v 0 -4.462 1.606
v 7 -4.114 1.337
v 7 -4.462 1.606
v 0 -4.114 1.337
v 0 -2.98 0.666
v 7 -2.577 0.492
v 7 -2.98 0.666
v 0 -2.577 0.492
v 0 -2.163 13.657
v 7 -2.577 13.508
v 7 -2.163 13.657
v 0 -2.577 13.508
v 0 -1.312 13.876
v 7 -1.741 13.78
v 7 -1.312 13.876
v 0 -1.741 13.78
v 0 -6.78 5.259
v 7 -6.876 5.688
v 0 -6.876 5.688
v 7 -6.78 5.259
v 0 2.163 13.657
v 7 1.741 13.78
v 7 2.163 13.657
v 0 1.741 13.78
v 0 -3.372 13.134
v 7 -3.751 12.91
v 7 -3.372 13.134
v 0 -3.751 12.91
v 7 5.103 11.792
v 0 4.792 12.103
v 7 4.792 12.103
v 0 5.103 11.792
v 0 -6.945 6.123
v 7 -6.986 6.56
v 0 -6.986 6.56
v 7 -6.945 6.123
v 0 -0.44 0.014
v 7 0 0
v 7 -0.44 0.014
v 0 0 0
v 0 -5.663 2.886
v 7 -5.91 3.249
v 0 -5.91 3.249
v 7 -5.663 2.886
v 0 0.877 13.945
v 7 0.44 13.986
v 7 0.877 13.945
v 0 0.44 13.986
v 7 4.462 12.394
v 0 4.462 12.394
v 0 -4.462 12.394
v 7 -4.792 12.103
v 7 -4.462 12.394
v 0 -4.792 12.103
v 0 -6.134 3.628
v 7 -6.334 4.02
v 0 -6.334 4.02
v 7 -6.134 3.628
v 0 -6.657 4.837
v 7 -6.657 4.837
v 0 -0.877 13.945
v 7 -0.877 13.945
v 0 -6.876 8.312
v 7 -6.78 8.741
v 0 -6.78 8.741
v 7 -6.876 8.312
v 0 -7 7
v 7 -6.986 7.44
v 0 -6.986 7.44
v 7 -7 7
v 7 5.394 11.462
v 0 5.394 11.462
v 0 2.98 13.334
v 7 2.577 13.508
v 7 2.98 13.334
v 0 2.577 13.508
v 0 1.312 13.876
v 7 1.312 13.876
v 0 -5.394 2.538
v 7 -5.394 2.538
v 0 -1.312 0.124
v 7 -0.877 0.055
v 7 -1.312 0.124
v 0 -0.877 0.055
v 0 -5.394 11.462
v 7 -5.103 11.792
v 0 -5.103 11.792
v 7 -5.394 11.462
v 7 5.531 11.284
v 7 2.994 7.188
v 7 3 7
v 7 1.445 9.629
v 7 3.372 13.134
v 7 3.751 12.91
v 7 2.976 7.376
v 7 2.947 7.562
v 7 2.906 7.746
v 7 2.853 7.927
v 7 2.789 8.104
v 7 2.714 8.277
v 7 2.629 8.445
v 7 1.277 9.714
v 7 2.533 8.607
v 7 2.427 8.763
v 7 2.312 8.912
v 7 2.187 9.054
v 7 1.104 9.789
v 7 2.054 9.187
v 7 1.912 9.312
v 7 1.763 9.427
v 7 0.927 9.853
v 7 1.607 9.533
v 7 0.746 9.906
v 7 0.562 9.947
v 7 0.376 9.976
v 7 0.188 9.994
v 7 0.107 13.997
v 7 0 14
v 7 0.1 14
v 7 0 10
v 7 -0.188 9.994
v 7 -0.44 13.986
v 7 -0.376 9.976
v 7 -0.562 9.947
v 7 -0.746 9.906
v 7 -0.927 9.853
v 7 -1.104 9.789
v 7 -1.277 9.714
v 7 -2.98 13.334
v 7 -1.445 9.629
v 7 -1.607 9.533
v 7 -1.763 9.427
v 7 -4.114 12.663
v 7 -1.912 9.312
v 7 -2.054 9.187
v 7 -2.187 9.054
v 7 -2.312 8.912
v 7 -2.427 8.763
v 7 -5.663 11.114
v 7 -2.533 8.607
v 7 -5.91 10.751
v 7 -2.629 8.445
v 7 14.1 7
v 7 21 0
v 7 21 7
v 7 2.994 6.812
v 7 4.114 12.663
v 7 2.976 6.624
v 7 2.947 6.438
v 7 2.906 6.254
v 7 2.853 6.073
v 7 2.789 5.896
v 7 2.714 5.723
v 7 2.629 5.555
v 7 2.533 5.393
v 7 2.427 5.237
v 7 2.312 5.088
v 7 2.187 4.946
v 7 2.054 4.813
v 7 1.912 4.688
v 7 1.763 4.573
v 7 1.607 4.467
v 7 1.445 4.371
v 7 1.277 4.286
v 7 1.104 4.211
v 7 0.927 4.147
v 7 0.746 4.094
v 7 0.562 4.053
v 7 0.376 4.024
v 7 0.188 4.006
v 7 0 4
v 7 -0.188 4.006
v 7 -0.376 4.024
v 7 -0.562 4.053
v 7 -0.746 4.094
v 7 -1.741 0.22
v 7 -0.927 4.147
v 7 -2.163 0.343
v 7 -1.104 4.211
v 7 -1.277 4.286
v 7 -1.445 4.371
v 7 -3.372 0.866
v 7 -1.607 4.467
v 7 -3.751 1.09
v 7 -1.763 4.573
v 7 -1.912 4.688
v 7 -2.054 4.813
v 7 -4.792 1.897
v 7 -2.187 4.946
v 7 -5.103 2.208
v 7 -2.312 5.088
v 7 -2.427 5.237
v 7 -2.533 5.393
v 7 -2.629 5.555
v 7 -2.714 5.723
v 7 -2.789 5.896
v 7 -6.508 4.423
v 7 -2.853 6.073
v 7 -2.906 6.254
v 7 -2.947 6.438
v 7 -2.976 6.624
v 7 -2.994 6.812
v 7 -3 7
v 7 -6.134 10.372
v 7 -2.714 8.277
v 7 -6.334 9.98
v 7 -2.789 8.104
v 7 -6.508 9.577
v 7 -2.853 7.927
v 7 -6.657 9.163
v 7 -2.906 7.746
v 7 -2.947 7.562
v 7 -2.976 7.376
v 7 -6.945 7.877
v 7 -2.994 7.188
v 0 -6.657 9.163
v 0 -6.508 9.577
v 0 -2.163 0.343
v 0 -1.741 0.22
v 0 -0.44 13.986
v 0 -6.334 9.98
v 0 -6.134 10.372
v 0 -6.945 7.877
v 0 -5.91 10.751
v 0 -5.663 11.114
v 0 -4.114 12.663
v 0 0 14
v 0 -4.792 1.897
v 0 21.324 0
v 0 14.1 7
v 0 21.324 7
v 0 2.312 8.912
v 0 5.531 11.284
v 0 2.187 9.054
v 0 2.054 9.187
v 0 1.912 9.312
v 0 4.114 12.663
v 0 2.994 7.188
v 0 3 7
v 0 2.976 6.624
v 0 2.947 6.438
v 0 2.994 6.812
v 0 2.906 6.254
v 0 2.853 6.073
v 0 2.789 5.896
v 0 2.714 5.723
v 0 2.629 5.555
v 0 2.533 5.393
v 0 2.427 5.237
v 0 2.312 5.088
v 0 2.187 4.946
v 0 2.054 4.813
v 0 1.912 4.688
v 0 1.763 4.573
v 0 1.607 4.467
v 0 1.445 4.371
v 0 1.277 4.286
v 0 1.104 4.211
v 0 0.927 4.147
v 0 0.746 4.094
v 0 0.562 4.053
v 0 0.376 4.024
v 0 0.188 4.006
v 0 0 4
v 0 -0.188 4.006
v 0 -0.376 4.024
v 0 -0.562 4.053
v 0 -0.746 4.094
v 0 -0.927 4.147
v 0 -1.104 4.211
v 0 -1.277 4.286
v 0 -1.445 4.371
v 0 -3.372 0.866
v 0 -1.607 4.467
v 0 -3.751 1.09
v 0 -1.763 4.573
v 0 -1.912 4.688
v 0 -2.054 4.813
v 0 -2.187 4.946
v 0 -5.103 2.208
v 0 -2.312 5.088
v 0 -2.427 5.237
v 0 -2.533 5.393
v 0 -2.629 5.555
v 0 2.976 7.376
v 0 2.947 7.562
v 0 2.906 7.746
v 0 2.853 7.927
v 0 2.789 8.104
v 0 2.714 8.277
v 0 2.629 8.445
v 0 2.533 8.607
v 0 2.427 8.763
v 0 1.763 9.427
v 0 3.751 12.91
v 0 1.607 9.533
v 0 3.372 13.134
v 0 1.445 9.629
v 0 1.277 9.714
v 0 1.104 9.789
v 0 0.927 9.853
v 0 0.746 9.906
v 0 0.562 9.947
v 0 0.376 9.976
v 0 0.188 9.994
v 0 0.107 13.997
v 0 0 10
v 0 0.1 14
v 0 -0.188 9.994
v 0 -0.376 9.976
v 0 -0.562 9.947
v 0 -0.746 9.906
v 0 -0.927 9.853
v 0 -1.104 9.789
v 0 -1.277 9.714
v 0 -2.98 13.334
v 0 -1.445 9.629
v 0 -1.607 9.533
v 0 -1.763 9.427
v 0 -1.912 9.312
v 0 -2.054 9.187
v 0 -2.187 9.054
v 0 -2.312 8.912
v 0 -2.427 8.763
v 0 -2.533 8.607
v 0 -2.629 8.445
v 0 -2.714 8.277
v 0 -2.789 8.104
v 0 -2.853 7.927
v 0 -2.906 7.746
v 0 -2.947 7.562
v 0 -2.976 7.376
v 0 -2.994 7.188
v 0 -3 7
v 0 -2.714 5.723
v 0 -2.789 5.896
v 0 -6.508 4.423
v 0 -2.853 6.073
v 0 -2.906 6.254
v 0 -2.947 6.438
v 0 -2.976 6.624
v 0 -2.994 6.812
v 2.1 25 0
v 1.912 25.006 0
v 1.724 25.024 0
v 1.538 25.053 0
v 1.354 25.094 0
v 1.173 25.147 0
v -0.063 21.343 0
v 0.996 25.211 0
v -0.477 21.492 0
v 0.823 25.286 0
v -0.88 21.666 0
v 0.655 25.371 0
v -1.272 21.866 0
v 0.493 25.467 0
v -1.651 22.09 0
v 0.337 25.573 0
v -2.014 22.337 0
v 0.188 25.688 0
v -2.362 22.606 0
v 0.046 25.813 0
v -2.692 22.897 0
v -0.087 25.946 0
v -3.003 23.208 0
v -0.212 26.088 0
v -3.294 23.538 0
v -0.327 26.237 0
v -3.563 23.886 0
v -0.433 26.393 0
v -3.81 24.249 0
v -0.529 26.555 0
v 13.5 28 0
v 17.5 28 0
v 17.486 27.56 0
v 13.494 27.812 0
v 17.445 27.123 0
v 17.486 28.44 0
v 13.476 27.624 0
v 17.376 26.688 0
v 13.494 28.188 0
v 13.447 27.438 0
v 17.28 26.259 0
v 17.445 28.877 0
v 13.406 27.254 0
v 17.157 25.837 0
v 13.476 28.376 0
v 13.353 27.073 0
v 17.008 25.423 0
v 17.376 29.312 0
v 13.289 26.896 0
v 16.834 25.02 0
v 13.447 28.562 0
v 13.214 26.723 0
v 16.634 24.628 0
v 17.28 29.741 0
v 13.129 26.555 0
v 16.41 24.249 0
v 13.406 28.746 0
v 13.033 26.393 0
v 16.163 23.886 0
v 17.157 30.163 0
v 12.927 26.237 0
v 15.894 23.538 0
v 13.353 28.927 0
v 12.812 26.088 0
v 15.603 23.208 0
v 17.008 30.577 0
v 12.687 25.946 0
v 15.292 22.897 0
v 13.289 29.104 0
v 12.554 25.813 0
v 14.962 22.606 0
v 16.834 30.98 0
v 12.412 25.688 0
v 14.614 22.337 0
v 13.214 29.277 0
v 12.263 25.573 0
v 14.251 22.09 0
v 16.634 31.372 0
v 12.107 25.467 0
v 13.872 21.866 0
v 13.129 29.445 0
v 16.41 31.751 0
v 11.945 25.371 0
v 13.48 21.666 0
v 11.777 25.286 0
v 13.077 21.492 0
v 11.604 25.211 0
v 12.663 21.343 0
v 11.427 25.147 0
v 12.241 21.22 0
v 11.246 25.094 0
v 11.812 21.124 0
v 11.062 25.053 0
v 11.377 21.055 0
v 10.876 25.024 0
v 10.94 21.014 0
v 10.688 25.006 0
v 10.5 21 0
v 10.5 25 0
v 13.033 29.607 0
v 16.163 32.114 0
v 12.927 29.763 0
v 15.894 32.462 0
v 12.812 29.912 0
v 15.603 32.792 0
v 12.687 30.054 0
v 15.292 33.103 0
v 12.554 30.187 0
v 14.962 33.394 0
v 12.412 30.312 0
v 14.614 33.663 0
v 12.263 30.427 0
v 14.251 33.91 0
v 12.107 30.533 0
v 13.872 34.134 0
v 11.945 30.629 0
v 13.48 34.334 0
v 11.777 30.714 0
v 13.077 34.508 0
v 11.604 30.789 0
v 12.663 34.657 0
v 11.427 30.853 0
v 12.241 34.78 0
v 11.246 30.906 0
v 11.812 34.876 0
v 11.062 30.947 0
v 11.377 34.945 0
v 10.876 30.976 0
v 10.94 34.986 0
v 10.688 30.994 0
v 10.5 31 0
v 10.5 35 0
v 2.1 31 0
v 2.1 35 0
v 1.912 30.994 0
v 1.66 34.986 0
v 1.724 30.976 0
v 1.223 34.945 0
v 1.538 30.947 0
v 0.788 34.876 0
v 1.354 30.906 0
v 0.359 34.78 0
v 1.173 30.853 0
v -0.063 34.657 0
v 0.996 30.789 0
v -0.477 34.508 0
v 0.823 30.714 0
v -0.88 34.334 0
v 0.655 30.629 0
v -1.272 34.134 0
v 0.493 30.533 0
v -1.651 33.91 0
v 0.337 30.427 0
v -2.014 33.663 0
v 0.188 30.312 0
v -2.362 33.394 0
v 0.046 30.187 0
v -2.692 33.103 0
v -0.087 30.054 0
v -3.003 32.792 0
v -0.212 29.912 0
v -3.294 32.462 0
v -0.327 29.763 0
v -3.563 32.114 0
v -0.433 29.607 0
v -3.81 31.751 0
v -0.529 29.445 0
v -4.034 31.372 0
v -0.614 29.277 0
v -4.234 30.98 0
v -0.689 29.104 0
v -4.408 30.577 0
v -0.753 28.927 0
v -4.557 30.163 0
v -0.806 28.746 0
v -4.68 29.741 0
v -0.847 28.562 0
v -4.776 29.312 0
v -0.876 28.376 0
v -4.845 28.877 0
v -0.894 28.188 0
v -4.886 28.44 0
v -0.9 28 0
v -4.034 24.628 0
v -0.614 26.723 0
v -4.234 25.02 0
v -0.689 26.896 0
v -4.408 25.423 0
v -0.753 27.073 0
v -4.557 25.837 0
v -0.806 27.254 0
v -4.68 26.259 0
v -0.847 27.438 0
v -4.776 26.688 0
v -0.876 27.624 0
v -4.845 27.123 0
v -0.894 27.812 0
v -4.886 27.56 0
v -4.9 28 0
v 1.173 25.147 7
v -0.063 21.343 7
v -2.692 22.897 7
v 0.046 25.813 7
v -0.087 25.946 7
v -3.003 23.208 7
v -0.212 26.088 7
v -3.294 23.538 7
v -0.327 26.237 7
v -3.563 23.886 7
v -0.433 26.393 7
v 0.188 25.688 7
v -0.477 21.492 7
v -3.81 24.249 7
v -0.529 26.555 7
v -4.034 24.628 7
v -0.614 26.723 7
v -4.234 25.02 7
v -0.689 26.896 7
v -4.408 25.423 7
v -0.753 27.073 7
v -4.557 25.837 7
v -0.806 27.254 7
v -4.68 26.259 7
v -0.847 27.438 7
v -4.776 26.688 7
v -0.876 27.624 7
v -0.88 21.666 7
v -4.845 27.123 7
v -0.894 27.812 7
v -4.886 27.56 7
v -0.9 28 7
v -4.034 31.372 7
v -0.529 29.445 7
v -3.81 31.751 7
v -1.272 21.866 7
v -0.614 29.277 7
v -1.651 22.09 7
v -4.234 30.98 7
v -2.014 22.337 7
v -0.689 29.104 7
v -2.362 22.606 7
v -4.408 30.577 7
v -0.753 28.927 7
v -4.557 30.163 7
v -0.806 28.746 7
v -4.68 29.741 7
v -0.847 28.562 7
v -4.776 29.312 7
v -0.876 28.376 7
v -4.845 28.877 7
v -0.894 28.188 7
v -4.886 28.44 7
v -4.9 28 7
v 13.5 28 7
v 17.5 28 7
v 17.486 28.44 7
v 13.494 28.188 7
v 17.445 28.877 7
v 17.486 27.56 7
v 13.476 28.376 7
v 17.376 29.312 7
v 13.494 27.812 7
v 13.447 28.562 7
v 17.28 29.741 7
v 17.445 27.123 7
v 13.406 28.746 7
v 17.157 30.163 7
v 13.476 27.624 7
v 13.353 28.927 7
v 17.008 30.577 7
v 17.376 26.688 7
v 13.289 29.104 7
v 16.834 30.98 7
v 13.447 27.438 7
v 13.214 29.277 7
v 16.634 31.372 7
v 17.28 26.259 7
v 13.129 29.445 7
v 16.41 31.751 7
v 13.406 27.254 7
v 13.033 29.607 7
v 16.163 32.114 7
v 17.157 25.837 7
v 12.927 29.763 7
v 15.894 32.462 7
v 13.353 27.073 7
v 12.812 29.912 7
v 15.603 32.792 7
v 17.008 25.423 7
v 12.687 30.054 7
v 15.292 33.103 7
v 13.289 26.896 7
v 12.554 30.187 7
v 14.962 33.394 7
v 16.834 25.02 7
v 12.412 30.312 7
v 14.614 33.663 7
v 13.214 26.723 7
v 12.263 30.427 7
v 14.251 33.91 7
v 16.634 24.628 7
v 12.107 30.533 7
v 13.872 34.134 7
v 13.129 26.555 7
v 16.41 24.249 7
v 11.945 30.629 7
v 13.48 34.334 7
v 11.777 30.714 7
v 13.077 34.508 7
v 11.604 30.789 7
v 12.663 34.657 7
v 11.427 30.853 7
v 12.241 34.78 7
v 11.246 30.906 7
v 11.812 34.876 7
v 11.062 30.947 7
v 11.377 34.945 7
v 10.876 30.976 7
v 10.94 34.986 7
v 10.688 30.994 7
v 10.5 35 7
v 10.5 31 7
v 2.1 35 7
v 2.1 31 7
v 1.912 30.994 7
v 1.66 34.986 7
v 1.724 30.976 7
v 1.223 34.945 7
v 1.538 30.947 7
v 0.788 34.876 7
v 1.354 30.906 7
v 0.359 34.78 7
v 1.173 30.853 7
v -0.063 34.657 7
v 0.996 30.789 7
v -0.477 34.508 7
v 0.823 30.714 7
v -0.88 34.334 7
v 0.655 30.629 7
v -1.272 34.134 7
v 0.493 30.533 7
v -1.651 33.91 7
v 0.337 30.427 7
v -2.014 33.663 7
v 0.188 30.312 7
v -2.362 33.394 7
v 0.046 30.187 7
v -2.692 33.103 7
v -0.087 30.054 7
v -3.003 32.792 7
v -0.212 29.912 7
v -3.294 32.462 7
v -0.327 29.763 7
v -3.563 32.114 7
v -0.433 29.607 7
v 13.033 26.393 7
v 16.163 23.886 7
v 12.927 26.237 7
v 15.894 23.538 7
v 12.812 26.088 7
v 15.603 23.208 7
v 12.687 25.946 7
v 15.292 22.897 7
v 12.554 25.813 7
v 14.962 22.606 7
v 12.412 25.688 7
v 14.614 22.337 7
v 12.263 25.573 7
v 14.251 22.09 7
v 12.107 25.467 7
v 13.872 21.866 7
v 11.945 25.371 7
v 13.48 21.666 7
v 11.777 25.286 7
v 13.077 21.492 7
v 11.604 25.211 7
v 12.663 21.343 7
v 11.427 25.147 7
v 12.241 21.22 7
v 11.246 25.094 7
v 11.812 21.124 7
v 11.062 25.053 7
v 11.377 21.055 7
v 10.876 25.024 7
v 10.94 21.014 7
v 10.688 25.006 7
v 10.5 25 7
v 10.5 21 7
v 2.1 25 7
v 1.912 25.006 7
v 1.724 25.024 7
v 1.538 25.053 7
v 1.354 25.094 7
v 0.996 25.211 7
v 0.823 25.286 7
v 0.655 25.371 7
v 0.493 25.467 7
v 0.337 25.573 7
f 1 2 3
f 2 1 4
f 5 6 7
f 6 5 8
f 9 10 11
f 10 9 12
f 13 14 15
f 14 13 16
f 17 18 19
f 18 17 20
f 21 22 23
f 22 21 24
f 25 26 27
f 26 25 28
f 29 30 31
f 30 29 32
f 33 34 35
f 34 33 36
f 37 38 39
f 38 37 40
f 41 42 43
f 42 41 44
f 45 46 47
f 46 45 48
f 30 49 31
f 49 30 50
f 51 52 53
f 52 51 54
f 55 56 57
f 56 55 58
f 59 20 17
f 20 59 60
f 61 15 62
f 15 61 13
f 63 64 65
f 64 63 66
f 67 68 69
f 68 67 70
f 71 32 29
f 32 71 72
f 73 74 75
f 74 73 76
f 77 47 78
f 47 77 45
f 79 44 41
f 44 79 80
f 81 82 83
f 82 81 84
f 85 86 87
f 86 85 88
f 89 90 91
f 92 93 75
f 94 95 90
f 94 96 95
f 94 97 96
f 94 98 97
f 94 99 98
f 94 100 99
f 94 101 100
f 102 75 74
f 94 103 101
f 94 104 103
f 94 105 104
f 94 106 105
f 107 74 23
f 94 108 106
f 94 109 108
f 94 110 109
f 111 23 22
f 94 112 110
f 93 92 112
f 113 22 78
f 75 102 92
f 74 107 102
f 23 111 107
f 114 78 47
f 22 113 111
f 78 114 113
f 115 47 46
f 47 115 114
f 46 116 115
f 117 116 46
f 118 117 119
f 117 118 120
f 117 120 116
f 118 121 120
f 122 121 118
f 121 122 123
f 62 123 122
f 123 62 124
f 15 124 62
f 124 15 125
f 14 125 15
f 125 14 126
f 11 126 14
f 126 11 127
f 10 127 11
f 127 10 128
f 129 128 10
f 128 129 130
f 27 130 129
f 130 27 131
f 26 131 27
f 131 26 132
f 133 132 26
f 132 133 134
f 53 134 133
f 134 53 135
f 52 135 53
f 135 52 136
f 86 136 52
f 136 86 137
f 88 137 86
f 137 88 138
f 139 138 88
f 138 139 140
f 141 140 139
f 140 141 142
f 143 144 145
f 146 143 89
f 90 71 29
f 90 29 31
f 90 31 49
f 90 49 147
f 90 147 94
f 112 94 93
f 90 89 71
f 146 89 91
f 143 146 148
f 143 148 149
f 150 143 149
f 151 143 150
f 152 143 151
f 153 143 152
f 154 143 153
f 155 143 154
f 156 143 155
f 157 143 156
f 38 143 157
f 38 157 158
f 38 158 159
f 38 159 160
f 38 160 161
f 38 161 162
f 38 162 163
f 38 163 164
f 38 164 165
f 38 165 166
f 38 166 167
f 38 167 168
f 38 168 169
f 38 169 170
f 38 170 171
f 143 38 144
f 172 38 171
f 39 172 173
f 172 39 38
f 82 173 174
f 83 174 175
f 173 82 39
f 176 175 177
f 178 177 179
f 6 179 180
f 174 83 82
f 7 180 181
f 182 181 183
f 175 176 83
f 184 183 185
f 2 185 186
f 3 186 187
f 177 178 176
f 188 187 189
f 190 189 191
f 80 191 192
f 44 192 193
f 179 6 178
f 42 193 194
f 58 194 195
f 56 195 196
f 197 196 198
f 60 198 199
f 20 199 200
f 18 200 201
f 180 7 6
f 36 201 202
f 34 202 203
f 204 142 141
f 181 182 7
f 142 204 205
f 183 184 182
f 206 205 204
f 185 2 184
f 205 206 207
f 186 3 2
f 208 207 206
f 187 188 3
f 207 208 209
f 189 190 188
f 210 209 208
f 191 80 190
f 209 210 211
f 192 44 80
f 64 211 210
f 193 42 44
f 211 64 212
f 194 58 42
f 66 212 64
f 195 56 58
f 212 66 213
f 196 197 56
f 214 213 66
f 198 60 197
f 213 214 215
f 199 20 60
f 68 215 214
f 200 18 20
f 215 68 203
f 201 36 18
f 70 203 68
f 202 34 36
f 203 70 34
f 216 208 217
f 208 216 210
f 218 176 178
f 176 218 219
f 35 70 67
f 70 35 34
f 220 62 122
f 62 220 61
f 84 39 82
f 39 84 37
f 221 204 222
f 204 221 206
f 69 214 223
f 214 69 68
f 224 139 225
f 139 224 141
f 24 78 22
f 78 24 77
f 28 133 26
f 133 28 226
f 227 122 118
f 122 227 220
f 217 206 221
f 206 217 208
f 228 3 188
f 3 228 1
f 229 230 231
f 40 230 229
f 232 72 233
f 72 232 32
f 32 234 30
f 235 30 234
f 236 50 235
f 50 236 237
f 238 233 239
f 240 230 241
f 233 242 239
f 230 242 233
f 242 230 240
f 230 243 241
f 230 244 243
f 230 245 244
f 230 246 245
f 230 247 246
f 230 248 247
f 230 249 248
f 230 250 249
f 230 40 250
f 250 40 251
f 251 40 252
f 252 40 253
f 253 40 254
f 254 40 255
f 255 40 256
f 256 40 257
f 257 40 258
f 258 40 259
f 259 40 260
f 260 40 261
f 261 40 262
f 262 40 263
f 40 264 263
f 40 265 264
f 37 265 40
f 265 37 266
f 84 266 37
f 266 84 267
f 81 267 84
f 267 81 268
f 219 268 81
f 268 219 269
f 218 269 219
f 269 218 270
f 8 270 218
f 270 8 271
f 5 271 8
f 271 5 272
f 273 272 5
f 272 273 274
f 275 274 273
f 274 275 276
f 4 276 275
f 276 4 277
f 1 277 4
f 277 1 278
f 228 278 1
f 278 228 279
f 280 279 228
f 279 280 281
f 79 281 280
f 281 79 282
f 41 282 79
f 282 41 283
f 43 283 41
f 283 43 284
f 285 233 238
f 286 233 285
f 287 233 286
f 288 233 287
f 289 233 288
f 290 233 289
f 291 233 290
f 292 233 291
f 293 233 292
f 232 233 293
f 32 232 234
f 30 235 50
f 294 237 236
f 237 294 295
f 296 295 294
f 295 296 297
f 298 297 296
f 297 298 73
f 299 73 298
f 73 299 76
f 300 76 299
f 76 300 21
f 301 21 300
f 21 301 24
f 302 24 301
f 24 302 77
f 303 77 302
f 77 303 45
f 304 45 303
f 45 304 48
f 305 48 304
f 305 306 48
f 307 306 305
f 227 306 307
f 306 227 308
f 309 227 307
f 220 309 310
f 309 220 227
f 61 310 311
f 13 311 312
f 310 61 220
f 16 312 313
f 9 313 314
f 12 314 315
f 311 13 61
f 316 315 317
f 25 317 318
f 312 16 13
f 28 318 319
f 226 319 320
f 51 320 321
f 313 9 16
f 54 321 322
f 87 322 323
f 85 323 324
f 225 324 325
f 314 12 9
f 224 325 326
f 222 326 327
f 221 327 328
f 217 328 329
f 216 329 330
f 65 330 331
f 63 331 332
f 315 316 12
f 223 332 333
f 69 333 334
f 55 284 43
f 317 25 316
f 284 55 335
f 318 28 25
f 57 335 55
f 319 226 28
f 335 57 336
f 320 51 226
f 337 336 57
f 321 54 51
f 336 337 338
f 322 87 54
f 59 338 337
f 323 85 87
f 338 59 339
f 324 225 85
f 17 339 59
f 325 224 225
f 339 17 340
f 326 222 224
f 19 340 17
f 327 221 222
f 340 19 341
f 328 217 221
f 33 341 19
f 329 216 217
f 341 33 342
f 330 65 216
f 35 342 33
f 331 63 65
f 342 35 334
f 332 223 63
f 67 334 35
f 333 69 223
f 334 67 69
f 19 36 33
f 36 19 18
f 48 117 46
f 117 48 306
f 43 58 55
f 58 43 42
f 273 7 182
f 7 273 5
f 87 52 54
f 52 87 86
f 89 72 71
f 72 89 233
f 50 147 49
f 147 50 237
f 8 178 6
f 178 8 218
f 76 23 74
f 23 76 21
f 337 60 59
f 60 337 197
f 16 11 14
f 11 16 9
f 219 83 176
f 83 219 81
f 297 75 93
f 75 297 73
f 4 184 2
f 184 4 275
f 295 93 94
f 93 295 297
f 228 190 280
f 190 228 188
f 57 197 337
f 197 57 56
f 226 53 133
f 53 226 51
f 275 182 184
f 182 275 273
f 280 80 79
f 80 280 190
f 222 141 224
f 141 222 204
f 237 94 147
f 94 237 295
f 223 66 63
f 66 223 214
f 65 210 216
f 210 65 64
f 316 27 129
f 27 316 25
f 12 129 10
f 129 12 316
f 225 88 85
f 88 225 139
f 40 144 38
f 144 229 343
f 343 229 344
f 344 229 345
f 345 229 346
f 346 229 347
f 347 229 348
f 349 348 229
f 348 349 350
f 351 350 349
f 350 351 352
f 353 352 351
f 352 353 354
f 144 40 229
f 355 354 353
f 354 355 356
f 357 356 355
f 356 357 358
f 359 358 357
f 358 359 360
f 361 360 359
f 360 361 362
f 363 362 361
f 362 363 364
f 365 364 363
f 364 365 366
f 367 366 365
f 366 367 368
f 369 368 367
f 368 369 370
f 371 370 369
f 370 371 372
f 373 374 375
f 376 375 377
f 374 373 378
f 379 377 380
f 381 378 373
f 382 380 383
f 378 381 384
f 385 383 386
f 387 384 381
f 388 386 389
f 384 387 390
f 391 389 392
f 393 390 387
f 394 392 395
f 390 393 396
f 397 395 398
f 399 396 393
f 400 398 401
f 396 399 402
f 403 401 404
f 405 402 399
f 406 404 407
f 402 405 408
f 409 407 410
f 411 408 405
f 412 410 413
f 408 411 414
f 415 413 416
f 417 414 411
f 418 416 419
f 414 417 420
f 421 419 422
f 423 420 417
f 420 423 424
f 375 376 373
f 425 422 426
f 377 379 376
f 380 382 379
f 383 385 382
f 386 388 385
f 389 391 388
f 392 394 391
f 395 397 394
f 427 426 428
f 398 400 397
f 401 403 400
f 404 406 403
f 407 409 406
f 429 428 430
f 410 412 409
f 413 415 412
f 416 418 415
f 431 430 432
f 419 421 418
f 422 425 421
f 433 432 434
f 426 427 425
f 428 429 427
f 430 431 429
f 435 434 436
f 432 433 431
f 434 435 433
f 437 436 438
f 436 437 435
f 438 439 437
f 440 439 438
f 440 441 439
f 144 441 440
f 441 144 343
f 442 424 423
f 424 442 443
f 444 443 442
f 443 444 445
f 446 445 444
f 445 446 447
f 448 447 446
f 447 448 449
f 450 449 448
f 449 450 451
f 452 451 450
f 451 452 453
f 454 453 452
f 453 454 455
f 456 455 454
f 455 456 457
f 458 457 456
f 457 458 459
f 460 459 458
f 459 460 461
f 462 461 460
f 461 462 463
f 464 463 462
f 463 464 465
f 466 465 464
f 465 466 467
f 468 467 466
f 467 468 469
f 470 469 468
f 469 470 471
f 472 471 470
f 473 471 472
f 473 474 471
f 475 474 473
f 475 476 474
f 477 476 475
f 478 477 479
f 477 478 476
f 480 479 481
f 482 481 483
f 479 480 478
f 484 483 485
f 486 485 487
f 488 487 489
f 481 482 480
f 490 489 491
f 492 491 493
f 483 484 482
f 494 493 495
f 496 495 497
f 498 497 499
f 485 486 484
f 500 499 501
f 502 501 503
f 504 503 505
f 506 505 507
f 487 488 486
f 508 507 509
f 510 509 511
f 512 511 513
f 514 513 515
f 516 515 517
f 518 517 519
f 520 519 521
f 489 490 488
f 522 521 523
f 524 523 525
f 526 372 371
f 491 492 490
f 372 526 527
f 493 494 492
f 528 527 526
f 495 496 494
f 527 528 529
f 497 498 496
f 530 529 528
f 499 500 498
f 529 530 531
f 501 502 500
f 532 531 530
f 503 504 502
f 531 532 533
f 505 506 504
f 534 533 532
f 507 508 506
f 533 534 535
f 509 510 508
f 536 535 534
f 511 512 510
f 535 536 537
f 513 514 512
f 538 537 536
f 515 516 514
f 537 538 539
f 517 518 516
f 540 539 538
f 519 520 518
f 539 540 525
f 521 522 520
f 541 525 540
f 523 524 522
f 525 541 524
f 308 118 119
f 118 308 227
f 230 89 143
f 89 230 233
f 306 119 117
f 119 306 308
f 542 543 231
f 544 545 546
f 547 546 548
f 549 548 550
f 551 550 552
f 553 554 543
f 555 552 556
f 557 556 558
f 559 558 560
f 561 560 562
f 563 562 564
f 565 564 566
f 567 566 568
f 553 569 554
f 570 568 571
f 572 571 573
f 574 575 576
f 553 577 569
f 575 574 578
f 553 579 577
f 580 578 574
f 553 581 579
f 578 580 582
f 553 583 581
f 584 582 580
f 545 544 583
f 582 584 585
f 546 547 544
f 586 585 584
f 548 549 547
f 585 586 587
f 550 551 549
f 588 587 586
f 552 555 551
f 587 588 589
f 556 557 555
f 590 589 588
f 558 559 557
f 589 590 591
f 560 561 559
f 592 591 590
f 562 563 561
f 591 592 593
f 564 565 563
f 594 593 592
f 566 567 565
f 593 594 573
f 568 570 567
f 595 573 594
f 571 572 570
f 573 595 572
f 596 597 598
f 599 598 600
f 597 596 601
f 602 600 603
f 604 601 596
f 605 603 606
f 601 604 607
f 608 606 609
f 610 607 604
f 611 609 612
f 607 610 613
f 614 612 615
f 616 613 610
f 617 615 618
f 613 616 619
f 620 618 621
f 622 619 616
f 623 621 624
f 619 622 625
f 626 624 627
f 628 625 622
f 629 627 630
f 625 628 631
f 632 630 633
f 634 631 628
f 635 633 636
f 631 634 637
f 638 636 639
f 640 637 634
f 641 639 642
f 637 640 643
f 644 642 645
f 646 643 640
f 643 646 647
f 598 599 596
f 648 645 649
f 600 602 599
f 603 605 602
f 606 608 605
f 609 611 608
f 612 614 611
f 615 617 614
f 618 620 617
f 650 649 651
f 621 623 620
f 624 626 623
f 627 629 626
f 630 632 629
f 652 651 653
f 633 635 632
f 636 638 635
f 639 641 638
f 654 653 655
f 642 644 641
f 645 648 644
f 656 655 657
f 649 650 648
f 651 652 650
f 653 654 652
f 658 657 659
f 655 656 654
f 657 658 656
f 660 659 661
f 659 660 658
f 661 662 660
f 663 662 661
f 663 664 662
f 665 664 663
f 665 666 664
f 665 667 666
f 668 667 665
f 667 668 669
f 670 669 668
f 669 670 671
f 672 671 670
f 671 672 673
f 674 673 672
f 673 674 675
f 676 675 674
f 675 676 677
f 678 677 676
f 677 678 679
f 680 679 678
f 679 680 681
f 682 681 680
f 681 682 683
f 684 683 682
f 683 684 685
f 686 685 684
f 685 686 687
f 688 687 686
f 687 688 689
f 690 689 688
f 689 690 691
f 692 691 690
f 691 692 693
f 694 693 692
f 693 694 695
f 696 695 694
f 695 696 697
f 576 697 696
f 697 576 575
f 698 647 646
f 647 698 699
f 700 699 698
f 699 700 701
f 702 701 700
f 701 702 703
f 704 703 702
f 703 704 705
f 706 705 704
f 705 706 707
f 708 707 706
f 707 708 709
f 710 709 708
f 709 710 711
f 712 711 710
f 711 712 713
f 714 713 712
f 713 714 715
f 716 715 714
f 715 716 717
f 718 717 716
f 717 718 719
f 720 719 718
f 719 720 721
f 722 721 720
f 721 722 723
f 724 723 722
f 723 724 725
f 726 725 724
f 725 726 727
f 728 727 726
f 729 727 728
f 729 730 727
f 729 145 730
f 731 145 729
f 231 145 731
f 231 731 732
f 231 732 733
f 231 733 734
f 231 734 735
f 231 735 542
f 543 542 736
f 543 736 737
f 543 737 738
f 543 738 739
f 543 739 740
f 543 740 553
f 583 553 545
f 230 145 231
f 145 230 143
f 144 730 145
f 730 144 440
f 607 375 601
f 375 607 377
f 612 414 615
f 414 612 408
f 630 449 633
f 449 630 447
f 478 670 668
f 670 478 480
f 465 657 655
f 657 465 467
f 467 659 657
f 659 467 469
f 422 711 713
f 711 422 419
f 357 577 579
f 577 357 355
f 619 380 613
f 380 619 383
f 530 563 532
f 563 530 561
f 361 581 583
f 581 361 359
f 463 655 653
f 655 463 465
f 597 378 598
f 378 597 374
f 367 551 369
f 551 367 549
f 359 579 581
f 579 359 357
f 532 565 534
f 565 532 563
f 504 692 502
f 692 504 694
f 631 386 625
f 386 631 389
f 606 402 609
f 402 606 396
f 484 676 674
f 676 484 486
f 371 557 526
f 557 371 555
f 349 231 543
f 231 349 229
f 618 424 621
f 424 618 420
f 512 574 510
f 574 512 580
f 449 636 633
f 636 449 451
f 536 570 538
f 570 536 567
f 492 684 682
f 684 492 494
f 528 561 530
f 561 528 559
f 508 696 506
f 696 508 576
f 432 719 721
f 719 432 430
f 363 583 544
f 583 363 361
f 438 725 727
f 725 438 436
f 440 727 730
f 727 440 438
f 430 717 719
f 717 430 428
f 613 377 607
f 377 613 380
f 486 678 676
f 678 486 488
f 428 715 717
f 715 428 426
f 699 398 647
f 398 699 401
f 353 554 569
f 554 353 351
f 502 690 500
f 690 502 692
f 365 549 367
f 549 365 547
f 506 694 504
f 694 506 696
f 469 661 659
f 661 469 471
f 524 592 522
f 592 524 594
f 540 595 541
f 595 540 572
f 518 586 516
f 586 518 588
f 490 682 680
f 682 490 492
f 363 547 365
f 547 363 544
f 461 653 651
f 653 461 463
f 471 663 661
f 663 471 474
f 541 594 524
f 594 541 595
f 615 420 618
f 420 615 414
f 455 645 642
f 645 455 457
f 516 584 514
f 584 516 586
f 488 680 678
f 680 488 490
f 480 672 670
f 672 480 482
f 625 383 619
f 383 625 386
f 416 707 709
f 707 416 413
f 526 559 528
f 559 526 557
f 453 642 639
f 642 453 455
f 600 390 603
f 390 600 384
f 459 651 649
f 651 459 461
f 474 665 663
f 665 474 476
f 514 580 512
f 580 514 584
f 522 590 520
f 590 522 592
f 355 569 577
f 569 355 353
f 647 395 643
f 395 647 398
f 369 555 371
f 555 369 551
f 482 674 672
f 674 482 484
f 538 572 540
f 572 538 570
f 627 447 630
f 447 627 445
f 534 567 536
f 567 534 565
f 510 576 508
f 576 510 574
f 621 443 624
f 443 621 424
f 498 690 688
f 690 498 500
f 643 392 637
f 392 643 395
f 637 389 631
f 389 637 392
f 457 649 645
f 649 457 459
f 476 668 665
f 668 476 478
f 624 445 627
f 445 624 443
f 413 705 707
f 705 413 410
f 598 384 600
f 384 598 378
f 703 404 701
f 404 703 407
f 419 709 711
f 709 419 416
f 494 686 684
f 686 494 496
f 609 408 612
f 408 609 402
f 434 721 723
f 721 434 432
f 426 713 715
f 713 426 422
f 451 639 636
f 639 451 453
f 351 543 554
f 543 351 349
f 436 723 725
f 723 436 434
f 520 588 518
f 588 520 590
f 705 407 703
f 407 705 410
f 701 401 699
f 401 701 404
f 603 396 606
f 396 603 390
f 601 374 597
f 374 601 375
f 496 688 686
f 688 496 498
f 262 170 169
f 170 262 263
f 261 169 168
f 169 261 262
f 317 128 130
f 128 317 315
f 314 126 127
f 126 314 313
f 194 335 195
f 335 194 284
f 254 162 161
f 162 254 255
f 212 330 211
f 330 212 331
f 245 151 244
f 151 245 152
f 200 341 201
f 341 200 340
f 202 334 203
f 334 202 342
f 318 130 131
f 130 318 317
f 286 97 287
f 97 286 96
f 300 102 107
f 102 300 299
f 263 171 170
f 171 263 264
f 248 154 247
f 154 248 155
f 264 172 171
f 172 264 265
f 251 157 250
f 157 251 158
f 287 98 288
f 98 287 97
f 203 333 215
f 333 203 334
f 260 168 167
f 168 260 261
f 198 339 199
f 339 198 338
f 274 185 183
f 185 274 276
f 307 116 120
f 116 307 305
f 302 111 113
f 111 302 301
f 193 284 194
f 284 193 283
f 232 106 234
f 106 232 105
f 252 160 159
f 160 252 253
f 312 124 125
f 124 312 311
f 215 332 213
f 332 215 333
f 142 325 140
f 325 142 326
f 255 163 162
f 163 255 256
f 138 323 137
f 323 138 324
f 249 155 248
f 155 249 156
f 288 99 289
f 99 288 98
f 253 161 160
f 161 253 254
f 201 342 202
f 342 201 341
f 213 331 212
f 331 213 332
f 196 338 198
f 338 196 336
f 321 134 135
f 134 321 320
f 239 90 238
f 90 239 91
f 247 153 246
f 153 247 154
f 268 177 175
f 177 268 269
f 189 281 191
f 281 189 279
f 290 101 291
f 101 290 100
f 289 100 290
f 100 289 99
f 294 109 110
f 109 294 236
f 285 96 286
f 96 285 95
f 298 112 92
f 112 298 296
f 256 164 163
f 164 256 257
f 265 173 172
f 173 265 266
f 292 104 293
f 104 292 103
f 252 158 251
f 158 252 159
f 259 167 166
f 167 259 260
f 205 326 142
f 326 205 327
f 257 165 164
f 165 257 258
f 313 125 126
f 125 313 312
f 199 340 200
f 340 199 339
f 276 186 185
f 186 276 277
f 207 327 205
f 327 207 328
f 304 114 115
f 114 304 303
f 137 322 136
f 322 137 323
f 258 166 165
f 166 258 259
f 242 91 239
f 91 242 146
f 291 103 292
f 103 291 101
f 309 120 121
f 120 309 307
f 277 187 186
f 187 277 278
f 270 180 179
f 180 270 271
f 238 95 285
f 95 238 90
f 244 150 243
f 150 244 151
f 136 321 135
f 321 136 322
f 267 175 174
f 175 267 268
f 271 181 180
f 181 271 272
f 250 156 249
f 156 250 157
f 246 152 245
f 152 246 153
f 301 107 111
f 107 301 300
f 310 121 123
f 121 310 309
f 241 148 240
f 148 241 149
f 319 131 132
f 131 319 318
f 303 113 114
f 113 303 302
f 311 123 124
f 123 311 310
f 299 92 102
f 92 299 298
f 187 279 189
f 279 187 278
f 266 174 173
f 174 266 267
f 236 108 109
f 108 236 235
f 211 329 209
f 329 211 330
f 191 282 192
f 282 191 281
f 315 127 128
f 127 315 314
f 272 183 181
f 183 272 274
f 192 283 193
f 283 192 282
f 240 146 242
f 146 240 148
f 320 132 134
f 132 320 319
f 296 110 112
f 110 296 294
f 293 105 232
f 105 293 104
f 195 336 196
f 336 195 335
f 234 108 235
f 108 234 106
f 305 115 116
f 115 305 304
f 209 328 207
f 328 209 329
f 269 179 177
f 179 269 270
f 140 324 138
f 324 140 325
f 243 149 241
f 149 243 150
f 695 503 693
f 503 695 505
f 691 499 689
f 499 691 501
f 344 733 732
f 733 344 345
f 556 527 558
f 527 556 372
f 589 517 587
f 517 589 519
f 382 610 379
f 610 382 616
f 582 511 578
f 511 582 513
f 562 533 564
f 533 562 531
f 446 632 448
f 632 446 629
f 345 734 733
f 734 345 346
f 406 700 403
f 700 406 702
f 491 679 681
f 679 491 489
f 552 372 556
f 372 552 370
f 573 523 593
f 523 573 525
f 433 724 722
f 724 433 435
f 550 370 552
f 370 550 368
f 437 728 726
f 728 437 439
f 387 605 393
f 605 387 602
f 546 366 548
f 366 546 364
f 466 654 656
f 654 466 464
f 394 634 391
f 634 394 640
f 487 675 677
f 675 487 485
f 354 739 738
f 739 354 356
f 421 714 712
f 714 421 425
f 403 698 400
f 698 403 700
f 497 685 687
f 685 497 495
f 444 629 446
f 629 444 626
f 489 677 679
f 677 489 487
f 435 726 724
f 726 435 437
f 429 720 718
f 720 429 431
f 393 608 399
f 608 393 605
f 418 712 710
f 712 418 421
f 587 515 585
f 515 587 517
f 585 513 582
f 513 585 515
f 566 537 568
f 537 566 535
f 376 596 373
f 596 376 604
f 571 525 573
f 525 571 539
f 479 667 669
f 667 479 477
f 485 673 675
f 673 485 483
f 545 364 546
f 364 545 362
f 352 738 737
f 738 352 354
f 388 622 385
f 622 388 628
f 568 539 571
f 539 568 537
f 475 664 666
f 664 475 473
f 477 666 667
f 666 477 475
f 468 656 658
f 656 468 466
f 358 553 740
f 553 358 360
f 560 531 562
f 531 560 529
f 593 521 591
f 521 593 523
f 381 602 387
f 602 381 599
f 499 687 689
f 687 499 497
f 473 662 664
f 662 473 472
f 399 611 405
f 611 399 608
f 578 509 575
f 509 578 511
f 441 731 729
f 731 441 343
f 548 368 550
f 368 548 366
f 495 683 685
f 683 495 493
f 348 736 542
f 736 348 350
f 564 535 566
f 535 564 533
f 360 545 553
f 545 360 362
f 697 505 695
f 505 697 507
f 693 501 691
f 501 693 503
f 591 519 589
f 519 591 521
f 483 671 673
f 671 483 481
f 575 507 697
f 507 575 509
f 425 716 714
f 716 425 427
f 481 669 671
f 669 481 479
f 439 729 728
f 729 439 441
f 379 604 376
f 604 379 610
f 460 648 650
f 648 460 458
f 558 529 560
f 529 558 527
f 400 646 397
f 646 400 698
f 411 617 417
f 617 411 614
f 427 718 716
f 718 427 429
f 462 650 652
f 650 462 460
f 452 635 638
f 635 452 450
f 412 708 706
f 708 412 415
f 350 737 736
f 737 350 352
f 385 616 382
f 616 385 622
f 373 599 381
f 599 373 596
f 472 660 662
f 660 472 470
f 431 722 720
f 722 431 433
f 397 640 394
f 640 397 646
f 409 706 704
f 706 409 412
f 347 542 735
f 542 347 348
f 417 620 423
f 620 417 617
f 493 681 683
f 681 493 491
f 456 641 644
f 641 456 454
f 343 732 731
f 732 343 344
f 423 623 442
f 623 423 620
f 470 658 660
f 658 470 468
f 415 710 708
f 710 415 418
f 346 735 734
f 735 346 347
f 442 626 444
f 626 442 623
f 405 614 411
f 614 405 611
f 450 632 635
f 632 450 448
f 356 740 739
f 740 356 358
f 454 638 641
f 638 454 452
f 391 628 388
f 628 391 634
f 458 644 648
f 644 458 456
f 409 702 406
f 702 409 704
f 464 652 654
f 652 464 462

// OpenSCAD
// file: utils.scad
module tube(r1, r2, h ){
    difference() {
        cylinder(r=r1, h=h);
        cylinder(r=r2, h=h);
    }
}

module taperout(r,h) {
    intersection(){
        cylinder(r=r, h=h);
        cube([r,r,h]);
    }
}

module taperin(r,h) {
    difference(){
        cube([r,r,h]);
        cylinder(r=r, h=h);
    }
}

module sector(radius, angles, fn = 24) {
    r = radius / cos(180 / fn);
    step = -360 / fn;

    points = concat([[0, 0]],
        [for(a = [angles[0] : step : angles[1] - 360]) 
            [r * cos(a), r * sin(a)]
        ],
        [[r * cos(angles[1]), r * sin(angles[1])]]
    );

    difference() {
        circle(radius, $fn = fn);
        polygon(points);
    }
}

module arc(radius, angles, width = 1, fn = 24) {
    difference() {
        sector(radius + width, angles, fn);
        sector(radius, angles, fn);
    }
} 

//linear_extrude(1) arc(radius, angles, width);


//tube(20,10,10);

// taperout(10,10);

 //taperin(10,10);
// main file
include <utils.scad>;

$fn=100;
module v1() {
H = 8;
D1 = 7;
D2 = 12;

D12 =6;

difference() {
    
    union(){
        translate([0,0,D2/2]) rotate([0,90,0]) cylinder(h=H, d=D2);

        translate([0,-D2/2,0]) cube([H,D2,D2/2]);

        translate([0,D2/2,0]) cube([H,D2/2,5]);

        translate([4,D2/2+9,0])  tube(h=5, r1=(D12+4)/2, r2=D12/2);
    }

translate([0,0,D2/2]) rotate([0,90,0]) cylinder(h=H, d=D1);
    
}

}

module v2(){
    
    H =8;
    R = 3; // D=6 holes
    P = 8;
    HP = 4;
    
    X = R+HP;

    difference() {
        union(){
            translate([0,0,X]) rotate([0,90,0]) cylinder(h=X, r=X);
            
            hull(){
                translate([0,0,0]) cube([X,0.1,2*X]);
                translate([0,2*X,0]) cube([X,X,X]);
            }

            hull(){
                translate([0,3*X,0]) rotate([0,0,0]) cylinder(h=X, r=X);
                translate([-2*X,3*X,0]) rotate([0,0,0]) cylinder(h=X, r=X);
            }
        }
        
    //holes
        union(){
            translate([0,0,R+HP]) rotate([0,90,0]) cylinder(h=H, r=R);
            hull(){
                translate([-0.5*X,3*X,0]) rotate([0,0,0]) cylinder(h=X, r=R);
                translate([-2*X,3*X,0]) rotate([0,0,0]) cylinder(h=X, r=R);
            }
        }
    }
}

module v3(){
    
    H =8;
    R = 3; // D=6 holes
    P = 8;
    HP = 4;
    
    X = R+HP;

    difference() {
        union(){
            translate([0,0,X]) rotate([0,90,0]) cylinder(h=X, r=X);
            
            hull(){
                translate([0,0,0]) cube([X,0.1,2*X]);
                translate([0,2*X,0]) cube([X,0.1,X]);
                //translate([-0.5*X,3*X,0]) rotate([0,0,0]) cube([X,0.1,X]);
            }
            

        translate([0,2*X,0]) cube([X,1.2*X,X]);

            translate([1.5*X,4*X,0])
            hull(){
                translate([0,0,0]) rotate([0,0,0]) cylinder(h=X, r=X);
                translate([-1.2*X,0,0]) rotate([0,0,0]) cylinder(h=X, r=X);
                //translate([-2*X,-X,0]) rotate([0,0,0]) cube([X,X,X]);
                //translate([0,-X,0]) rotate([0,0,0]) cube([X,X,X]);
            }
            
           
        }
        
    //holes
        union(){
            translate([0,0,R+HP]) rotate([0,90,0]) cylinder(h=H, r=R);
            translate([1.5*X,4*X,0])
            hull(){
                translate([-0*X,0,0]) rotate([0,0,0]) cylinder(h=X, r=R);
                translate([-1.2*X,0,0]) rotate([0,0,0]) cylinder(h=X, r=R);
            }
        }
    }
}

v3();
